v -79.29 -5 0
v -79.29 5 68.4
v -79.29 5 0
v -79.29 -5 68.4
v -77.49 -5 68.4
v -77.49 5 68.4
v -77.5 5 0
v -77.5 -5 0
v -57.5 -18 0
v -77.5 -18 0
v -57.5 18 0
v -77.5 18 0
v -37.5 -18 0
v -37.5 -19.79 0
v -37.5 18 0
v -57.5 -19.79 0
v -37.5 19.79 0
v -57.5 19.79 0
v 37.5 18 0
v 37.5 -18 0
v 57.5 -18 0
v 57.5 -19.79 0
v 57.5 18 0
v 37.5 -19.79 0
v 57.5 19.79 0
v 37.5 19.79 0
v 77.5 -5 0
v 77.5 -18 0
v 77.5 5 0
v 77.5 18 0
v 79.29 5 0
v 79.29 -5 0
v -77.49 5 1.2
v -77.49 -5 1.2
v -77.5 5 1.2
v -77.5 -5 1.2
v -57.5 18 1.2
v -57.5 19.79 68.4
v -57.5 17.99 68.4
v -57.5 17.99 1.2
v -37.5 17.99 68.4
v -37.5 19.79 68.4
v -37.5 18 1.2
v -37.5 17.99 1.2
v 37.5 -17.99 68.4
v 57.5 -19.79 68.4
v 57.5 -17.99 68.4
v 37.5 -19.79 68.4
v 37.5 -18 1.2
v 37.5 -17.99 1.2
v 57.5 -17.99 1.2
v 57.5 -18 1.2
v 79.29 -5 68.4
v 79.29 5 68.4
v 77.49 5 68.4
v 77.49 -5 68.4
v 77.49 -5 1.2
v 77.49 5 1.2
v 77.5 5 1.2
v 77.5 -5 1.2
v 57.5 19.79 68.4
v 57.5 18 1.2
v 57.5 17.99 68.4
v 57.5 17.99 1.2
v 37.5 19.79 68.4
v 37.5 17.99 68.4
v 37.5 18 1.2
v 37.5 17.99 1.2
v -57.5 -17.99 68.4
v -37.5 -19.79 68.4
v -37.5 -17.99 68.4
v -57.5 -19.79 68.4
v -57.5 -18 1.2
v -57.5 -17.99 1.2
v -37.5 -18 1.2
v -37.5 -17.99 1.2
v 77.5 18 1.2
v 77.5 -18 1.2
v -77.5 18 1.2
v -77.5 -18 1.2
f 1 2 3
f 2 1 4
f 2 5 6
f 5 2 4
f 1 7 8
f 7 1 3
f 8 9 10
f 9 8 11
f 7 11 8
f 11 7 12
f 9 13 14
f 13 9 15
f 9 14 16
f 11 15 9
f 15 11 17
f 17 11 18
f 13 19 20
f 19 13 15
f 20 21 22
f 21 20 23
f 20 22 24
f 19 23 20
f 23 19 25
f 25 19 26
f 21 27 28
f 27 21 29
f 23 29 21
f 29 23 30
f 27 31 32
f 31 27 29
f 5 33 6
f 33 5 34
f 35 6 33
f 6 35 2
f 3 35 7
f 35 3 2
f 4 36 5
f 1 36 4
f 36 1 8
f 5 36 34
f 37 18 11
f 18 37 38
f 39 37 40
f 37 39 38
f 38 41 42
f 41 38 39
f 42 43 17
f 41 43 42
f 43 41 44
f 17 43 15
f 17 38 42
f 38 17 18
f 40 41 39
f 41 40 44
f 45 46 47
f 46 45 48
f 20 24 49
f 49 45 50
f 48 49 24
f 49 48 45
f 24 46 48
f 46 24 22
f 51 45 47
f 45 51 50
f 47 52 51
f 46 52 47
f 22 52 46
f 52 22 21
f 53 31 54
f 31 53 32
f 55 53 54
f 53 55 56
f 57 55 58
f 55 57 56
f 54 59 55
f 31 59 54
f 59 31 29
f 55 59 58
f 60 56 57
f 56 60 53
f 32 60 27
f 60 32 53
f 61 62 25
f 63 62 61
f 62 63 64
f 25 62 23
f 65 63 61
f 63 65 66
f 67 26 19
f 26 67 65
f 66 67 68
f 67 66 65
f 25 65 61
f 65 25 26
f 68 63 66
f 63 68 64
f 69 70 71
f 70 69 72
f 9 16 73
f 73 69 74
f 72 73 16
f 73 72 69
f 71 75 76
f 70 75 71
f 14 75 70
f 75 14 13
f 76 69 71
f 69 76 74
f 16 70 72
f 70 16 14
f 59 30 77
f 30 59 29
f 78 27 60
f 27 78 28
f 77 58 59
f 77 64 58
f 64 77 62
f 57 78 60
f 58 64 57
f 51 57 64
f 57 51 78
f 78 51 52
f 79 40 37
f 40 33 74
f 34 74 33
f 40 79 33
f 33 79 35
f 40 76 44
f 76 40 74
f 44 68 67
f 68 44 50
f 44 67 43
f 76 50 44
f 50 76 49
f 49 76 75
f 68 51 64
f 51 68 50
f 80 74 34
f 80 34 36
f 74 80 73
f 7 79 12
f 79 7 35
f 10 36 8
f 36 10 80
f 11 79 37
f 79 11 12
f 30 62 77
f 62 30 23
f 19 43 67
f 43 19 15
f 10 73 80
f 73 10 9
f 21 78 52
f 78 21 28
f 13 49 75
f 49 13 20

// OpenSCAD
// -*- mode: SCAD ; c-file-style: "ellemtel" ; coding: utf-8 -*-
//
// correctly sized simple shape to stack four picture 135 type film strips
//
// © 2018 Roland Sieker <ospalh@gmail.com>
// Licence: CC-BY-SA 4.0


// … to preview. You will get all parts when you click “Create Thing”.
part = "stack"; // [stack: Stapler, lid: Deckel]

// Set this to “render” and click on “Create Thing” when done with the setup.
preview = 1; // [0:render, 1:preview]
// not needed


l1 = 8*4.75;
ex = 3;
num = 4;
lld = l1*num;
ll = lld + ex;
ey = 1;
w1 = 35;
wst = w1+ey; // 9.2 mm + clearance
wld = w1-ey; // Make it fit between the plates without problems

w = 1.2;  // Wall width

h = 66; // I have a lot of film strips i want to stack
epl = 10;
spl = 20;
spo = 20;

/* [Hidden] */

// Done with the customizer

// *******************************************************
// Extra parameters. These can be changed reasonably safely.


w = 1.8;  // Wall width
p = 1.2;  // Bottom, top plate height
c = 0.4;  // Clearance
angle = 60; // Overhangs much below 60° are a problem for me

// *******************************************************
// Some shortcuts. These shouldn’t be changed

tau = 2 * PI;  // π is still wrong. τ = circumference ÷ r

xy_factor = 1/tan(angle);
// To get from a height to a horizontal width inclined correctly
z_factor = tan(angle);  // The other way around

he = h + 2*p;
spo2 = ll/2 - spo - spl;

some_distance = 50;
ms = 0.01;  // Muggeseggele.

// fn for differently sized objects and fs, fa; all for preview or rendering.
pna = 40;
pnb = 15;
pa = 5;
ps = 1;
rna = 180;
rnb = 30;
ra = 1;
rs = 0.1;
function na() = (preview) ? pna : rna;
function nb() = (preview) ? pnb : rnb;
$fs = (preview) ? ps : rs;
$fa = (preview) ? pa : ra;

// *******************************************************
// End setup



// *******************************************************
// Generate the parts

print_part();
// preview_parts();
// stack_parts();



module print_part()
{
   if ("stack" == part)
   {
      stack();
   }
   if ("lid" == part)
   {
      lid();
   }
}

module preview_parts()
{
   stack();
   translate([0, some_distance, 0])
   {
      lid();
   }
}

module stack_parts()
{
   // intersection()
   {
      color("yellow")
      {
         stack();
      }
      translate([0,0, 3*p])
      {
         color("red")
         {
            lid();
         }
      }
   }
}

// *******************************************************
// Code for the parts themselves

module stack()
{
   translate([0,0,p/2])
   {
      cube([ll, wst, p], center=true);
   }
   plates();
}


module lid()
{
   translate([0,0,p/2])
   {
      cube([lld, wld, p], center=true);
   }
}


module plates()
{
   end_plate();
   side_plate();
   rotate(180)
   {
      side_plate();
   }
   mirror()
   {
      end_plate();
      side_plate();
      rotate(180)
      {
         side_plate();
      }
   }
}

module end_plate()
{
   translate([ll/2-ms , -epl/2,0])
   {
      cube([w, epl, he]);
   }
}

module side_plate()
{
   translate([spo2, wst/2-ms,0])
   {
      cube([spl, w, he]);
   }
}
